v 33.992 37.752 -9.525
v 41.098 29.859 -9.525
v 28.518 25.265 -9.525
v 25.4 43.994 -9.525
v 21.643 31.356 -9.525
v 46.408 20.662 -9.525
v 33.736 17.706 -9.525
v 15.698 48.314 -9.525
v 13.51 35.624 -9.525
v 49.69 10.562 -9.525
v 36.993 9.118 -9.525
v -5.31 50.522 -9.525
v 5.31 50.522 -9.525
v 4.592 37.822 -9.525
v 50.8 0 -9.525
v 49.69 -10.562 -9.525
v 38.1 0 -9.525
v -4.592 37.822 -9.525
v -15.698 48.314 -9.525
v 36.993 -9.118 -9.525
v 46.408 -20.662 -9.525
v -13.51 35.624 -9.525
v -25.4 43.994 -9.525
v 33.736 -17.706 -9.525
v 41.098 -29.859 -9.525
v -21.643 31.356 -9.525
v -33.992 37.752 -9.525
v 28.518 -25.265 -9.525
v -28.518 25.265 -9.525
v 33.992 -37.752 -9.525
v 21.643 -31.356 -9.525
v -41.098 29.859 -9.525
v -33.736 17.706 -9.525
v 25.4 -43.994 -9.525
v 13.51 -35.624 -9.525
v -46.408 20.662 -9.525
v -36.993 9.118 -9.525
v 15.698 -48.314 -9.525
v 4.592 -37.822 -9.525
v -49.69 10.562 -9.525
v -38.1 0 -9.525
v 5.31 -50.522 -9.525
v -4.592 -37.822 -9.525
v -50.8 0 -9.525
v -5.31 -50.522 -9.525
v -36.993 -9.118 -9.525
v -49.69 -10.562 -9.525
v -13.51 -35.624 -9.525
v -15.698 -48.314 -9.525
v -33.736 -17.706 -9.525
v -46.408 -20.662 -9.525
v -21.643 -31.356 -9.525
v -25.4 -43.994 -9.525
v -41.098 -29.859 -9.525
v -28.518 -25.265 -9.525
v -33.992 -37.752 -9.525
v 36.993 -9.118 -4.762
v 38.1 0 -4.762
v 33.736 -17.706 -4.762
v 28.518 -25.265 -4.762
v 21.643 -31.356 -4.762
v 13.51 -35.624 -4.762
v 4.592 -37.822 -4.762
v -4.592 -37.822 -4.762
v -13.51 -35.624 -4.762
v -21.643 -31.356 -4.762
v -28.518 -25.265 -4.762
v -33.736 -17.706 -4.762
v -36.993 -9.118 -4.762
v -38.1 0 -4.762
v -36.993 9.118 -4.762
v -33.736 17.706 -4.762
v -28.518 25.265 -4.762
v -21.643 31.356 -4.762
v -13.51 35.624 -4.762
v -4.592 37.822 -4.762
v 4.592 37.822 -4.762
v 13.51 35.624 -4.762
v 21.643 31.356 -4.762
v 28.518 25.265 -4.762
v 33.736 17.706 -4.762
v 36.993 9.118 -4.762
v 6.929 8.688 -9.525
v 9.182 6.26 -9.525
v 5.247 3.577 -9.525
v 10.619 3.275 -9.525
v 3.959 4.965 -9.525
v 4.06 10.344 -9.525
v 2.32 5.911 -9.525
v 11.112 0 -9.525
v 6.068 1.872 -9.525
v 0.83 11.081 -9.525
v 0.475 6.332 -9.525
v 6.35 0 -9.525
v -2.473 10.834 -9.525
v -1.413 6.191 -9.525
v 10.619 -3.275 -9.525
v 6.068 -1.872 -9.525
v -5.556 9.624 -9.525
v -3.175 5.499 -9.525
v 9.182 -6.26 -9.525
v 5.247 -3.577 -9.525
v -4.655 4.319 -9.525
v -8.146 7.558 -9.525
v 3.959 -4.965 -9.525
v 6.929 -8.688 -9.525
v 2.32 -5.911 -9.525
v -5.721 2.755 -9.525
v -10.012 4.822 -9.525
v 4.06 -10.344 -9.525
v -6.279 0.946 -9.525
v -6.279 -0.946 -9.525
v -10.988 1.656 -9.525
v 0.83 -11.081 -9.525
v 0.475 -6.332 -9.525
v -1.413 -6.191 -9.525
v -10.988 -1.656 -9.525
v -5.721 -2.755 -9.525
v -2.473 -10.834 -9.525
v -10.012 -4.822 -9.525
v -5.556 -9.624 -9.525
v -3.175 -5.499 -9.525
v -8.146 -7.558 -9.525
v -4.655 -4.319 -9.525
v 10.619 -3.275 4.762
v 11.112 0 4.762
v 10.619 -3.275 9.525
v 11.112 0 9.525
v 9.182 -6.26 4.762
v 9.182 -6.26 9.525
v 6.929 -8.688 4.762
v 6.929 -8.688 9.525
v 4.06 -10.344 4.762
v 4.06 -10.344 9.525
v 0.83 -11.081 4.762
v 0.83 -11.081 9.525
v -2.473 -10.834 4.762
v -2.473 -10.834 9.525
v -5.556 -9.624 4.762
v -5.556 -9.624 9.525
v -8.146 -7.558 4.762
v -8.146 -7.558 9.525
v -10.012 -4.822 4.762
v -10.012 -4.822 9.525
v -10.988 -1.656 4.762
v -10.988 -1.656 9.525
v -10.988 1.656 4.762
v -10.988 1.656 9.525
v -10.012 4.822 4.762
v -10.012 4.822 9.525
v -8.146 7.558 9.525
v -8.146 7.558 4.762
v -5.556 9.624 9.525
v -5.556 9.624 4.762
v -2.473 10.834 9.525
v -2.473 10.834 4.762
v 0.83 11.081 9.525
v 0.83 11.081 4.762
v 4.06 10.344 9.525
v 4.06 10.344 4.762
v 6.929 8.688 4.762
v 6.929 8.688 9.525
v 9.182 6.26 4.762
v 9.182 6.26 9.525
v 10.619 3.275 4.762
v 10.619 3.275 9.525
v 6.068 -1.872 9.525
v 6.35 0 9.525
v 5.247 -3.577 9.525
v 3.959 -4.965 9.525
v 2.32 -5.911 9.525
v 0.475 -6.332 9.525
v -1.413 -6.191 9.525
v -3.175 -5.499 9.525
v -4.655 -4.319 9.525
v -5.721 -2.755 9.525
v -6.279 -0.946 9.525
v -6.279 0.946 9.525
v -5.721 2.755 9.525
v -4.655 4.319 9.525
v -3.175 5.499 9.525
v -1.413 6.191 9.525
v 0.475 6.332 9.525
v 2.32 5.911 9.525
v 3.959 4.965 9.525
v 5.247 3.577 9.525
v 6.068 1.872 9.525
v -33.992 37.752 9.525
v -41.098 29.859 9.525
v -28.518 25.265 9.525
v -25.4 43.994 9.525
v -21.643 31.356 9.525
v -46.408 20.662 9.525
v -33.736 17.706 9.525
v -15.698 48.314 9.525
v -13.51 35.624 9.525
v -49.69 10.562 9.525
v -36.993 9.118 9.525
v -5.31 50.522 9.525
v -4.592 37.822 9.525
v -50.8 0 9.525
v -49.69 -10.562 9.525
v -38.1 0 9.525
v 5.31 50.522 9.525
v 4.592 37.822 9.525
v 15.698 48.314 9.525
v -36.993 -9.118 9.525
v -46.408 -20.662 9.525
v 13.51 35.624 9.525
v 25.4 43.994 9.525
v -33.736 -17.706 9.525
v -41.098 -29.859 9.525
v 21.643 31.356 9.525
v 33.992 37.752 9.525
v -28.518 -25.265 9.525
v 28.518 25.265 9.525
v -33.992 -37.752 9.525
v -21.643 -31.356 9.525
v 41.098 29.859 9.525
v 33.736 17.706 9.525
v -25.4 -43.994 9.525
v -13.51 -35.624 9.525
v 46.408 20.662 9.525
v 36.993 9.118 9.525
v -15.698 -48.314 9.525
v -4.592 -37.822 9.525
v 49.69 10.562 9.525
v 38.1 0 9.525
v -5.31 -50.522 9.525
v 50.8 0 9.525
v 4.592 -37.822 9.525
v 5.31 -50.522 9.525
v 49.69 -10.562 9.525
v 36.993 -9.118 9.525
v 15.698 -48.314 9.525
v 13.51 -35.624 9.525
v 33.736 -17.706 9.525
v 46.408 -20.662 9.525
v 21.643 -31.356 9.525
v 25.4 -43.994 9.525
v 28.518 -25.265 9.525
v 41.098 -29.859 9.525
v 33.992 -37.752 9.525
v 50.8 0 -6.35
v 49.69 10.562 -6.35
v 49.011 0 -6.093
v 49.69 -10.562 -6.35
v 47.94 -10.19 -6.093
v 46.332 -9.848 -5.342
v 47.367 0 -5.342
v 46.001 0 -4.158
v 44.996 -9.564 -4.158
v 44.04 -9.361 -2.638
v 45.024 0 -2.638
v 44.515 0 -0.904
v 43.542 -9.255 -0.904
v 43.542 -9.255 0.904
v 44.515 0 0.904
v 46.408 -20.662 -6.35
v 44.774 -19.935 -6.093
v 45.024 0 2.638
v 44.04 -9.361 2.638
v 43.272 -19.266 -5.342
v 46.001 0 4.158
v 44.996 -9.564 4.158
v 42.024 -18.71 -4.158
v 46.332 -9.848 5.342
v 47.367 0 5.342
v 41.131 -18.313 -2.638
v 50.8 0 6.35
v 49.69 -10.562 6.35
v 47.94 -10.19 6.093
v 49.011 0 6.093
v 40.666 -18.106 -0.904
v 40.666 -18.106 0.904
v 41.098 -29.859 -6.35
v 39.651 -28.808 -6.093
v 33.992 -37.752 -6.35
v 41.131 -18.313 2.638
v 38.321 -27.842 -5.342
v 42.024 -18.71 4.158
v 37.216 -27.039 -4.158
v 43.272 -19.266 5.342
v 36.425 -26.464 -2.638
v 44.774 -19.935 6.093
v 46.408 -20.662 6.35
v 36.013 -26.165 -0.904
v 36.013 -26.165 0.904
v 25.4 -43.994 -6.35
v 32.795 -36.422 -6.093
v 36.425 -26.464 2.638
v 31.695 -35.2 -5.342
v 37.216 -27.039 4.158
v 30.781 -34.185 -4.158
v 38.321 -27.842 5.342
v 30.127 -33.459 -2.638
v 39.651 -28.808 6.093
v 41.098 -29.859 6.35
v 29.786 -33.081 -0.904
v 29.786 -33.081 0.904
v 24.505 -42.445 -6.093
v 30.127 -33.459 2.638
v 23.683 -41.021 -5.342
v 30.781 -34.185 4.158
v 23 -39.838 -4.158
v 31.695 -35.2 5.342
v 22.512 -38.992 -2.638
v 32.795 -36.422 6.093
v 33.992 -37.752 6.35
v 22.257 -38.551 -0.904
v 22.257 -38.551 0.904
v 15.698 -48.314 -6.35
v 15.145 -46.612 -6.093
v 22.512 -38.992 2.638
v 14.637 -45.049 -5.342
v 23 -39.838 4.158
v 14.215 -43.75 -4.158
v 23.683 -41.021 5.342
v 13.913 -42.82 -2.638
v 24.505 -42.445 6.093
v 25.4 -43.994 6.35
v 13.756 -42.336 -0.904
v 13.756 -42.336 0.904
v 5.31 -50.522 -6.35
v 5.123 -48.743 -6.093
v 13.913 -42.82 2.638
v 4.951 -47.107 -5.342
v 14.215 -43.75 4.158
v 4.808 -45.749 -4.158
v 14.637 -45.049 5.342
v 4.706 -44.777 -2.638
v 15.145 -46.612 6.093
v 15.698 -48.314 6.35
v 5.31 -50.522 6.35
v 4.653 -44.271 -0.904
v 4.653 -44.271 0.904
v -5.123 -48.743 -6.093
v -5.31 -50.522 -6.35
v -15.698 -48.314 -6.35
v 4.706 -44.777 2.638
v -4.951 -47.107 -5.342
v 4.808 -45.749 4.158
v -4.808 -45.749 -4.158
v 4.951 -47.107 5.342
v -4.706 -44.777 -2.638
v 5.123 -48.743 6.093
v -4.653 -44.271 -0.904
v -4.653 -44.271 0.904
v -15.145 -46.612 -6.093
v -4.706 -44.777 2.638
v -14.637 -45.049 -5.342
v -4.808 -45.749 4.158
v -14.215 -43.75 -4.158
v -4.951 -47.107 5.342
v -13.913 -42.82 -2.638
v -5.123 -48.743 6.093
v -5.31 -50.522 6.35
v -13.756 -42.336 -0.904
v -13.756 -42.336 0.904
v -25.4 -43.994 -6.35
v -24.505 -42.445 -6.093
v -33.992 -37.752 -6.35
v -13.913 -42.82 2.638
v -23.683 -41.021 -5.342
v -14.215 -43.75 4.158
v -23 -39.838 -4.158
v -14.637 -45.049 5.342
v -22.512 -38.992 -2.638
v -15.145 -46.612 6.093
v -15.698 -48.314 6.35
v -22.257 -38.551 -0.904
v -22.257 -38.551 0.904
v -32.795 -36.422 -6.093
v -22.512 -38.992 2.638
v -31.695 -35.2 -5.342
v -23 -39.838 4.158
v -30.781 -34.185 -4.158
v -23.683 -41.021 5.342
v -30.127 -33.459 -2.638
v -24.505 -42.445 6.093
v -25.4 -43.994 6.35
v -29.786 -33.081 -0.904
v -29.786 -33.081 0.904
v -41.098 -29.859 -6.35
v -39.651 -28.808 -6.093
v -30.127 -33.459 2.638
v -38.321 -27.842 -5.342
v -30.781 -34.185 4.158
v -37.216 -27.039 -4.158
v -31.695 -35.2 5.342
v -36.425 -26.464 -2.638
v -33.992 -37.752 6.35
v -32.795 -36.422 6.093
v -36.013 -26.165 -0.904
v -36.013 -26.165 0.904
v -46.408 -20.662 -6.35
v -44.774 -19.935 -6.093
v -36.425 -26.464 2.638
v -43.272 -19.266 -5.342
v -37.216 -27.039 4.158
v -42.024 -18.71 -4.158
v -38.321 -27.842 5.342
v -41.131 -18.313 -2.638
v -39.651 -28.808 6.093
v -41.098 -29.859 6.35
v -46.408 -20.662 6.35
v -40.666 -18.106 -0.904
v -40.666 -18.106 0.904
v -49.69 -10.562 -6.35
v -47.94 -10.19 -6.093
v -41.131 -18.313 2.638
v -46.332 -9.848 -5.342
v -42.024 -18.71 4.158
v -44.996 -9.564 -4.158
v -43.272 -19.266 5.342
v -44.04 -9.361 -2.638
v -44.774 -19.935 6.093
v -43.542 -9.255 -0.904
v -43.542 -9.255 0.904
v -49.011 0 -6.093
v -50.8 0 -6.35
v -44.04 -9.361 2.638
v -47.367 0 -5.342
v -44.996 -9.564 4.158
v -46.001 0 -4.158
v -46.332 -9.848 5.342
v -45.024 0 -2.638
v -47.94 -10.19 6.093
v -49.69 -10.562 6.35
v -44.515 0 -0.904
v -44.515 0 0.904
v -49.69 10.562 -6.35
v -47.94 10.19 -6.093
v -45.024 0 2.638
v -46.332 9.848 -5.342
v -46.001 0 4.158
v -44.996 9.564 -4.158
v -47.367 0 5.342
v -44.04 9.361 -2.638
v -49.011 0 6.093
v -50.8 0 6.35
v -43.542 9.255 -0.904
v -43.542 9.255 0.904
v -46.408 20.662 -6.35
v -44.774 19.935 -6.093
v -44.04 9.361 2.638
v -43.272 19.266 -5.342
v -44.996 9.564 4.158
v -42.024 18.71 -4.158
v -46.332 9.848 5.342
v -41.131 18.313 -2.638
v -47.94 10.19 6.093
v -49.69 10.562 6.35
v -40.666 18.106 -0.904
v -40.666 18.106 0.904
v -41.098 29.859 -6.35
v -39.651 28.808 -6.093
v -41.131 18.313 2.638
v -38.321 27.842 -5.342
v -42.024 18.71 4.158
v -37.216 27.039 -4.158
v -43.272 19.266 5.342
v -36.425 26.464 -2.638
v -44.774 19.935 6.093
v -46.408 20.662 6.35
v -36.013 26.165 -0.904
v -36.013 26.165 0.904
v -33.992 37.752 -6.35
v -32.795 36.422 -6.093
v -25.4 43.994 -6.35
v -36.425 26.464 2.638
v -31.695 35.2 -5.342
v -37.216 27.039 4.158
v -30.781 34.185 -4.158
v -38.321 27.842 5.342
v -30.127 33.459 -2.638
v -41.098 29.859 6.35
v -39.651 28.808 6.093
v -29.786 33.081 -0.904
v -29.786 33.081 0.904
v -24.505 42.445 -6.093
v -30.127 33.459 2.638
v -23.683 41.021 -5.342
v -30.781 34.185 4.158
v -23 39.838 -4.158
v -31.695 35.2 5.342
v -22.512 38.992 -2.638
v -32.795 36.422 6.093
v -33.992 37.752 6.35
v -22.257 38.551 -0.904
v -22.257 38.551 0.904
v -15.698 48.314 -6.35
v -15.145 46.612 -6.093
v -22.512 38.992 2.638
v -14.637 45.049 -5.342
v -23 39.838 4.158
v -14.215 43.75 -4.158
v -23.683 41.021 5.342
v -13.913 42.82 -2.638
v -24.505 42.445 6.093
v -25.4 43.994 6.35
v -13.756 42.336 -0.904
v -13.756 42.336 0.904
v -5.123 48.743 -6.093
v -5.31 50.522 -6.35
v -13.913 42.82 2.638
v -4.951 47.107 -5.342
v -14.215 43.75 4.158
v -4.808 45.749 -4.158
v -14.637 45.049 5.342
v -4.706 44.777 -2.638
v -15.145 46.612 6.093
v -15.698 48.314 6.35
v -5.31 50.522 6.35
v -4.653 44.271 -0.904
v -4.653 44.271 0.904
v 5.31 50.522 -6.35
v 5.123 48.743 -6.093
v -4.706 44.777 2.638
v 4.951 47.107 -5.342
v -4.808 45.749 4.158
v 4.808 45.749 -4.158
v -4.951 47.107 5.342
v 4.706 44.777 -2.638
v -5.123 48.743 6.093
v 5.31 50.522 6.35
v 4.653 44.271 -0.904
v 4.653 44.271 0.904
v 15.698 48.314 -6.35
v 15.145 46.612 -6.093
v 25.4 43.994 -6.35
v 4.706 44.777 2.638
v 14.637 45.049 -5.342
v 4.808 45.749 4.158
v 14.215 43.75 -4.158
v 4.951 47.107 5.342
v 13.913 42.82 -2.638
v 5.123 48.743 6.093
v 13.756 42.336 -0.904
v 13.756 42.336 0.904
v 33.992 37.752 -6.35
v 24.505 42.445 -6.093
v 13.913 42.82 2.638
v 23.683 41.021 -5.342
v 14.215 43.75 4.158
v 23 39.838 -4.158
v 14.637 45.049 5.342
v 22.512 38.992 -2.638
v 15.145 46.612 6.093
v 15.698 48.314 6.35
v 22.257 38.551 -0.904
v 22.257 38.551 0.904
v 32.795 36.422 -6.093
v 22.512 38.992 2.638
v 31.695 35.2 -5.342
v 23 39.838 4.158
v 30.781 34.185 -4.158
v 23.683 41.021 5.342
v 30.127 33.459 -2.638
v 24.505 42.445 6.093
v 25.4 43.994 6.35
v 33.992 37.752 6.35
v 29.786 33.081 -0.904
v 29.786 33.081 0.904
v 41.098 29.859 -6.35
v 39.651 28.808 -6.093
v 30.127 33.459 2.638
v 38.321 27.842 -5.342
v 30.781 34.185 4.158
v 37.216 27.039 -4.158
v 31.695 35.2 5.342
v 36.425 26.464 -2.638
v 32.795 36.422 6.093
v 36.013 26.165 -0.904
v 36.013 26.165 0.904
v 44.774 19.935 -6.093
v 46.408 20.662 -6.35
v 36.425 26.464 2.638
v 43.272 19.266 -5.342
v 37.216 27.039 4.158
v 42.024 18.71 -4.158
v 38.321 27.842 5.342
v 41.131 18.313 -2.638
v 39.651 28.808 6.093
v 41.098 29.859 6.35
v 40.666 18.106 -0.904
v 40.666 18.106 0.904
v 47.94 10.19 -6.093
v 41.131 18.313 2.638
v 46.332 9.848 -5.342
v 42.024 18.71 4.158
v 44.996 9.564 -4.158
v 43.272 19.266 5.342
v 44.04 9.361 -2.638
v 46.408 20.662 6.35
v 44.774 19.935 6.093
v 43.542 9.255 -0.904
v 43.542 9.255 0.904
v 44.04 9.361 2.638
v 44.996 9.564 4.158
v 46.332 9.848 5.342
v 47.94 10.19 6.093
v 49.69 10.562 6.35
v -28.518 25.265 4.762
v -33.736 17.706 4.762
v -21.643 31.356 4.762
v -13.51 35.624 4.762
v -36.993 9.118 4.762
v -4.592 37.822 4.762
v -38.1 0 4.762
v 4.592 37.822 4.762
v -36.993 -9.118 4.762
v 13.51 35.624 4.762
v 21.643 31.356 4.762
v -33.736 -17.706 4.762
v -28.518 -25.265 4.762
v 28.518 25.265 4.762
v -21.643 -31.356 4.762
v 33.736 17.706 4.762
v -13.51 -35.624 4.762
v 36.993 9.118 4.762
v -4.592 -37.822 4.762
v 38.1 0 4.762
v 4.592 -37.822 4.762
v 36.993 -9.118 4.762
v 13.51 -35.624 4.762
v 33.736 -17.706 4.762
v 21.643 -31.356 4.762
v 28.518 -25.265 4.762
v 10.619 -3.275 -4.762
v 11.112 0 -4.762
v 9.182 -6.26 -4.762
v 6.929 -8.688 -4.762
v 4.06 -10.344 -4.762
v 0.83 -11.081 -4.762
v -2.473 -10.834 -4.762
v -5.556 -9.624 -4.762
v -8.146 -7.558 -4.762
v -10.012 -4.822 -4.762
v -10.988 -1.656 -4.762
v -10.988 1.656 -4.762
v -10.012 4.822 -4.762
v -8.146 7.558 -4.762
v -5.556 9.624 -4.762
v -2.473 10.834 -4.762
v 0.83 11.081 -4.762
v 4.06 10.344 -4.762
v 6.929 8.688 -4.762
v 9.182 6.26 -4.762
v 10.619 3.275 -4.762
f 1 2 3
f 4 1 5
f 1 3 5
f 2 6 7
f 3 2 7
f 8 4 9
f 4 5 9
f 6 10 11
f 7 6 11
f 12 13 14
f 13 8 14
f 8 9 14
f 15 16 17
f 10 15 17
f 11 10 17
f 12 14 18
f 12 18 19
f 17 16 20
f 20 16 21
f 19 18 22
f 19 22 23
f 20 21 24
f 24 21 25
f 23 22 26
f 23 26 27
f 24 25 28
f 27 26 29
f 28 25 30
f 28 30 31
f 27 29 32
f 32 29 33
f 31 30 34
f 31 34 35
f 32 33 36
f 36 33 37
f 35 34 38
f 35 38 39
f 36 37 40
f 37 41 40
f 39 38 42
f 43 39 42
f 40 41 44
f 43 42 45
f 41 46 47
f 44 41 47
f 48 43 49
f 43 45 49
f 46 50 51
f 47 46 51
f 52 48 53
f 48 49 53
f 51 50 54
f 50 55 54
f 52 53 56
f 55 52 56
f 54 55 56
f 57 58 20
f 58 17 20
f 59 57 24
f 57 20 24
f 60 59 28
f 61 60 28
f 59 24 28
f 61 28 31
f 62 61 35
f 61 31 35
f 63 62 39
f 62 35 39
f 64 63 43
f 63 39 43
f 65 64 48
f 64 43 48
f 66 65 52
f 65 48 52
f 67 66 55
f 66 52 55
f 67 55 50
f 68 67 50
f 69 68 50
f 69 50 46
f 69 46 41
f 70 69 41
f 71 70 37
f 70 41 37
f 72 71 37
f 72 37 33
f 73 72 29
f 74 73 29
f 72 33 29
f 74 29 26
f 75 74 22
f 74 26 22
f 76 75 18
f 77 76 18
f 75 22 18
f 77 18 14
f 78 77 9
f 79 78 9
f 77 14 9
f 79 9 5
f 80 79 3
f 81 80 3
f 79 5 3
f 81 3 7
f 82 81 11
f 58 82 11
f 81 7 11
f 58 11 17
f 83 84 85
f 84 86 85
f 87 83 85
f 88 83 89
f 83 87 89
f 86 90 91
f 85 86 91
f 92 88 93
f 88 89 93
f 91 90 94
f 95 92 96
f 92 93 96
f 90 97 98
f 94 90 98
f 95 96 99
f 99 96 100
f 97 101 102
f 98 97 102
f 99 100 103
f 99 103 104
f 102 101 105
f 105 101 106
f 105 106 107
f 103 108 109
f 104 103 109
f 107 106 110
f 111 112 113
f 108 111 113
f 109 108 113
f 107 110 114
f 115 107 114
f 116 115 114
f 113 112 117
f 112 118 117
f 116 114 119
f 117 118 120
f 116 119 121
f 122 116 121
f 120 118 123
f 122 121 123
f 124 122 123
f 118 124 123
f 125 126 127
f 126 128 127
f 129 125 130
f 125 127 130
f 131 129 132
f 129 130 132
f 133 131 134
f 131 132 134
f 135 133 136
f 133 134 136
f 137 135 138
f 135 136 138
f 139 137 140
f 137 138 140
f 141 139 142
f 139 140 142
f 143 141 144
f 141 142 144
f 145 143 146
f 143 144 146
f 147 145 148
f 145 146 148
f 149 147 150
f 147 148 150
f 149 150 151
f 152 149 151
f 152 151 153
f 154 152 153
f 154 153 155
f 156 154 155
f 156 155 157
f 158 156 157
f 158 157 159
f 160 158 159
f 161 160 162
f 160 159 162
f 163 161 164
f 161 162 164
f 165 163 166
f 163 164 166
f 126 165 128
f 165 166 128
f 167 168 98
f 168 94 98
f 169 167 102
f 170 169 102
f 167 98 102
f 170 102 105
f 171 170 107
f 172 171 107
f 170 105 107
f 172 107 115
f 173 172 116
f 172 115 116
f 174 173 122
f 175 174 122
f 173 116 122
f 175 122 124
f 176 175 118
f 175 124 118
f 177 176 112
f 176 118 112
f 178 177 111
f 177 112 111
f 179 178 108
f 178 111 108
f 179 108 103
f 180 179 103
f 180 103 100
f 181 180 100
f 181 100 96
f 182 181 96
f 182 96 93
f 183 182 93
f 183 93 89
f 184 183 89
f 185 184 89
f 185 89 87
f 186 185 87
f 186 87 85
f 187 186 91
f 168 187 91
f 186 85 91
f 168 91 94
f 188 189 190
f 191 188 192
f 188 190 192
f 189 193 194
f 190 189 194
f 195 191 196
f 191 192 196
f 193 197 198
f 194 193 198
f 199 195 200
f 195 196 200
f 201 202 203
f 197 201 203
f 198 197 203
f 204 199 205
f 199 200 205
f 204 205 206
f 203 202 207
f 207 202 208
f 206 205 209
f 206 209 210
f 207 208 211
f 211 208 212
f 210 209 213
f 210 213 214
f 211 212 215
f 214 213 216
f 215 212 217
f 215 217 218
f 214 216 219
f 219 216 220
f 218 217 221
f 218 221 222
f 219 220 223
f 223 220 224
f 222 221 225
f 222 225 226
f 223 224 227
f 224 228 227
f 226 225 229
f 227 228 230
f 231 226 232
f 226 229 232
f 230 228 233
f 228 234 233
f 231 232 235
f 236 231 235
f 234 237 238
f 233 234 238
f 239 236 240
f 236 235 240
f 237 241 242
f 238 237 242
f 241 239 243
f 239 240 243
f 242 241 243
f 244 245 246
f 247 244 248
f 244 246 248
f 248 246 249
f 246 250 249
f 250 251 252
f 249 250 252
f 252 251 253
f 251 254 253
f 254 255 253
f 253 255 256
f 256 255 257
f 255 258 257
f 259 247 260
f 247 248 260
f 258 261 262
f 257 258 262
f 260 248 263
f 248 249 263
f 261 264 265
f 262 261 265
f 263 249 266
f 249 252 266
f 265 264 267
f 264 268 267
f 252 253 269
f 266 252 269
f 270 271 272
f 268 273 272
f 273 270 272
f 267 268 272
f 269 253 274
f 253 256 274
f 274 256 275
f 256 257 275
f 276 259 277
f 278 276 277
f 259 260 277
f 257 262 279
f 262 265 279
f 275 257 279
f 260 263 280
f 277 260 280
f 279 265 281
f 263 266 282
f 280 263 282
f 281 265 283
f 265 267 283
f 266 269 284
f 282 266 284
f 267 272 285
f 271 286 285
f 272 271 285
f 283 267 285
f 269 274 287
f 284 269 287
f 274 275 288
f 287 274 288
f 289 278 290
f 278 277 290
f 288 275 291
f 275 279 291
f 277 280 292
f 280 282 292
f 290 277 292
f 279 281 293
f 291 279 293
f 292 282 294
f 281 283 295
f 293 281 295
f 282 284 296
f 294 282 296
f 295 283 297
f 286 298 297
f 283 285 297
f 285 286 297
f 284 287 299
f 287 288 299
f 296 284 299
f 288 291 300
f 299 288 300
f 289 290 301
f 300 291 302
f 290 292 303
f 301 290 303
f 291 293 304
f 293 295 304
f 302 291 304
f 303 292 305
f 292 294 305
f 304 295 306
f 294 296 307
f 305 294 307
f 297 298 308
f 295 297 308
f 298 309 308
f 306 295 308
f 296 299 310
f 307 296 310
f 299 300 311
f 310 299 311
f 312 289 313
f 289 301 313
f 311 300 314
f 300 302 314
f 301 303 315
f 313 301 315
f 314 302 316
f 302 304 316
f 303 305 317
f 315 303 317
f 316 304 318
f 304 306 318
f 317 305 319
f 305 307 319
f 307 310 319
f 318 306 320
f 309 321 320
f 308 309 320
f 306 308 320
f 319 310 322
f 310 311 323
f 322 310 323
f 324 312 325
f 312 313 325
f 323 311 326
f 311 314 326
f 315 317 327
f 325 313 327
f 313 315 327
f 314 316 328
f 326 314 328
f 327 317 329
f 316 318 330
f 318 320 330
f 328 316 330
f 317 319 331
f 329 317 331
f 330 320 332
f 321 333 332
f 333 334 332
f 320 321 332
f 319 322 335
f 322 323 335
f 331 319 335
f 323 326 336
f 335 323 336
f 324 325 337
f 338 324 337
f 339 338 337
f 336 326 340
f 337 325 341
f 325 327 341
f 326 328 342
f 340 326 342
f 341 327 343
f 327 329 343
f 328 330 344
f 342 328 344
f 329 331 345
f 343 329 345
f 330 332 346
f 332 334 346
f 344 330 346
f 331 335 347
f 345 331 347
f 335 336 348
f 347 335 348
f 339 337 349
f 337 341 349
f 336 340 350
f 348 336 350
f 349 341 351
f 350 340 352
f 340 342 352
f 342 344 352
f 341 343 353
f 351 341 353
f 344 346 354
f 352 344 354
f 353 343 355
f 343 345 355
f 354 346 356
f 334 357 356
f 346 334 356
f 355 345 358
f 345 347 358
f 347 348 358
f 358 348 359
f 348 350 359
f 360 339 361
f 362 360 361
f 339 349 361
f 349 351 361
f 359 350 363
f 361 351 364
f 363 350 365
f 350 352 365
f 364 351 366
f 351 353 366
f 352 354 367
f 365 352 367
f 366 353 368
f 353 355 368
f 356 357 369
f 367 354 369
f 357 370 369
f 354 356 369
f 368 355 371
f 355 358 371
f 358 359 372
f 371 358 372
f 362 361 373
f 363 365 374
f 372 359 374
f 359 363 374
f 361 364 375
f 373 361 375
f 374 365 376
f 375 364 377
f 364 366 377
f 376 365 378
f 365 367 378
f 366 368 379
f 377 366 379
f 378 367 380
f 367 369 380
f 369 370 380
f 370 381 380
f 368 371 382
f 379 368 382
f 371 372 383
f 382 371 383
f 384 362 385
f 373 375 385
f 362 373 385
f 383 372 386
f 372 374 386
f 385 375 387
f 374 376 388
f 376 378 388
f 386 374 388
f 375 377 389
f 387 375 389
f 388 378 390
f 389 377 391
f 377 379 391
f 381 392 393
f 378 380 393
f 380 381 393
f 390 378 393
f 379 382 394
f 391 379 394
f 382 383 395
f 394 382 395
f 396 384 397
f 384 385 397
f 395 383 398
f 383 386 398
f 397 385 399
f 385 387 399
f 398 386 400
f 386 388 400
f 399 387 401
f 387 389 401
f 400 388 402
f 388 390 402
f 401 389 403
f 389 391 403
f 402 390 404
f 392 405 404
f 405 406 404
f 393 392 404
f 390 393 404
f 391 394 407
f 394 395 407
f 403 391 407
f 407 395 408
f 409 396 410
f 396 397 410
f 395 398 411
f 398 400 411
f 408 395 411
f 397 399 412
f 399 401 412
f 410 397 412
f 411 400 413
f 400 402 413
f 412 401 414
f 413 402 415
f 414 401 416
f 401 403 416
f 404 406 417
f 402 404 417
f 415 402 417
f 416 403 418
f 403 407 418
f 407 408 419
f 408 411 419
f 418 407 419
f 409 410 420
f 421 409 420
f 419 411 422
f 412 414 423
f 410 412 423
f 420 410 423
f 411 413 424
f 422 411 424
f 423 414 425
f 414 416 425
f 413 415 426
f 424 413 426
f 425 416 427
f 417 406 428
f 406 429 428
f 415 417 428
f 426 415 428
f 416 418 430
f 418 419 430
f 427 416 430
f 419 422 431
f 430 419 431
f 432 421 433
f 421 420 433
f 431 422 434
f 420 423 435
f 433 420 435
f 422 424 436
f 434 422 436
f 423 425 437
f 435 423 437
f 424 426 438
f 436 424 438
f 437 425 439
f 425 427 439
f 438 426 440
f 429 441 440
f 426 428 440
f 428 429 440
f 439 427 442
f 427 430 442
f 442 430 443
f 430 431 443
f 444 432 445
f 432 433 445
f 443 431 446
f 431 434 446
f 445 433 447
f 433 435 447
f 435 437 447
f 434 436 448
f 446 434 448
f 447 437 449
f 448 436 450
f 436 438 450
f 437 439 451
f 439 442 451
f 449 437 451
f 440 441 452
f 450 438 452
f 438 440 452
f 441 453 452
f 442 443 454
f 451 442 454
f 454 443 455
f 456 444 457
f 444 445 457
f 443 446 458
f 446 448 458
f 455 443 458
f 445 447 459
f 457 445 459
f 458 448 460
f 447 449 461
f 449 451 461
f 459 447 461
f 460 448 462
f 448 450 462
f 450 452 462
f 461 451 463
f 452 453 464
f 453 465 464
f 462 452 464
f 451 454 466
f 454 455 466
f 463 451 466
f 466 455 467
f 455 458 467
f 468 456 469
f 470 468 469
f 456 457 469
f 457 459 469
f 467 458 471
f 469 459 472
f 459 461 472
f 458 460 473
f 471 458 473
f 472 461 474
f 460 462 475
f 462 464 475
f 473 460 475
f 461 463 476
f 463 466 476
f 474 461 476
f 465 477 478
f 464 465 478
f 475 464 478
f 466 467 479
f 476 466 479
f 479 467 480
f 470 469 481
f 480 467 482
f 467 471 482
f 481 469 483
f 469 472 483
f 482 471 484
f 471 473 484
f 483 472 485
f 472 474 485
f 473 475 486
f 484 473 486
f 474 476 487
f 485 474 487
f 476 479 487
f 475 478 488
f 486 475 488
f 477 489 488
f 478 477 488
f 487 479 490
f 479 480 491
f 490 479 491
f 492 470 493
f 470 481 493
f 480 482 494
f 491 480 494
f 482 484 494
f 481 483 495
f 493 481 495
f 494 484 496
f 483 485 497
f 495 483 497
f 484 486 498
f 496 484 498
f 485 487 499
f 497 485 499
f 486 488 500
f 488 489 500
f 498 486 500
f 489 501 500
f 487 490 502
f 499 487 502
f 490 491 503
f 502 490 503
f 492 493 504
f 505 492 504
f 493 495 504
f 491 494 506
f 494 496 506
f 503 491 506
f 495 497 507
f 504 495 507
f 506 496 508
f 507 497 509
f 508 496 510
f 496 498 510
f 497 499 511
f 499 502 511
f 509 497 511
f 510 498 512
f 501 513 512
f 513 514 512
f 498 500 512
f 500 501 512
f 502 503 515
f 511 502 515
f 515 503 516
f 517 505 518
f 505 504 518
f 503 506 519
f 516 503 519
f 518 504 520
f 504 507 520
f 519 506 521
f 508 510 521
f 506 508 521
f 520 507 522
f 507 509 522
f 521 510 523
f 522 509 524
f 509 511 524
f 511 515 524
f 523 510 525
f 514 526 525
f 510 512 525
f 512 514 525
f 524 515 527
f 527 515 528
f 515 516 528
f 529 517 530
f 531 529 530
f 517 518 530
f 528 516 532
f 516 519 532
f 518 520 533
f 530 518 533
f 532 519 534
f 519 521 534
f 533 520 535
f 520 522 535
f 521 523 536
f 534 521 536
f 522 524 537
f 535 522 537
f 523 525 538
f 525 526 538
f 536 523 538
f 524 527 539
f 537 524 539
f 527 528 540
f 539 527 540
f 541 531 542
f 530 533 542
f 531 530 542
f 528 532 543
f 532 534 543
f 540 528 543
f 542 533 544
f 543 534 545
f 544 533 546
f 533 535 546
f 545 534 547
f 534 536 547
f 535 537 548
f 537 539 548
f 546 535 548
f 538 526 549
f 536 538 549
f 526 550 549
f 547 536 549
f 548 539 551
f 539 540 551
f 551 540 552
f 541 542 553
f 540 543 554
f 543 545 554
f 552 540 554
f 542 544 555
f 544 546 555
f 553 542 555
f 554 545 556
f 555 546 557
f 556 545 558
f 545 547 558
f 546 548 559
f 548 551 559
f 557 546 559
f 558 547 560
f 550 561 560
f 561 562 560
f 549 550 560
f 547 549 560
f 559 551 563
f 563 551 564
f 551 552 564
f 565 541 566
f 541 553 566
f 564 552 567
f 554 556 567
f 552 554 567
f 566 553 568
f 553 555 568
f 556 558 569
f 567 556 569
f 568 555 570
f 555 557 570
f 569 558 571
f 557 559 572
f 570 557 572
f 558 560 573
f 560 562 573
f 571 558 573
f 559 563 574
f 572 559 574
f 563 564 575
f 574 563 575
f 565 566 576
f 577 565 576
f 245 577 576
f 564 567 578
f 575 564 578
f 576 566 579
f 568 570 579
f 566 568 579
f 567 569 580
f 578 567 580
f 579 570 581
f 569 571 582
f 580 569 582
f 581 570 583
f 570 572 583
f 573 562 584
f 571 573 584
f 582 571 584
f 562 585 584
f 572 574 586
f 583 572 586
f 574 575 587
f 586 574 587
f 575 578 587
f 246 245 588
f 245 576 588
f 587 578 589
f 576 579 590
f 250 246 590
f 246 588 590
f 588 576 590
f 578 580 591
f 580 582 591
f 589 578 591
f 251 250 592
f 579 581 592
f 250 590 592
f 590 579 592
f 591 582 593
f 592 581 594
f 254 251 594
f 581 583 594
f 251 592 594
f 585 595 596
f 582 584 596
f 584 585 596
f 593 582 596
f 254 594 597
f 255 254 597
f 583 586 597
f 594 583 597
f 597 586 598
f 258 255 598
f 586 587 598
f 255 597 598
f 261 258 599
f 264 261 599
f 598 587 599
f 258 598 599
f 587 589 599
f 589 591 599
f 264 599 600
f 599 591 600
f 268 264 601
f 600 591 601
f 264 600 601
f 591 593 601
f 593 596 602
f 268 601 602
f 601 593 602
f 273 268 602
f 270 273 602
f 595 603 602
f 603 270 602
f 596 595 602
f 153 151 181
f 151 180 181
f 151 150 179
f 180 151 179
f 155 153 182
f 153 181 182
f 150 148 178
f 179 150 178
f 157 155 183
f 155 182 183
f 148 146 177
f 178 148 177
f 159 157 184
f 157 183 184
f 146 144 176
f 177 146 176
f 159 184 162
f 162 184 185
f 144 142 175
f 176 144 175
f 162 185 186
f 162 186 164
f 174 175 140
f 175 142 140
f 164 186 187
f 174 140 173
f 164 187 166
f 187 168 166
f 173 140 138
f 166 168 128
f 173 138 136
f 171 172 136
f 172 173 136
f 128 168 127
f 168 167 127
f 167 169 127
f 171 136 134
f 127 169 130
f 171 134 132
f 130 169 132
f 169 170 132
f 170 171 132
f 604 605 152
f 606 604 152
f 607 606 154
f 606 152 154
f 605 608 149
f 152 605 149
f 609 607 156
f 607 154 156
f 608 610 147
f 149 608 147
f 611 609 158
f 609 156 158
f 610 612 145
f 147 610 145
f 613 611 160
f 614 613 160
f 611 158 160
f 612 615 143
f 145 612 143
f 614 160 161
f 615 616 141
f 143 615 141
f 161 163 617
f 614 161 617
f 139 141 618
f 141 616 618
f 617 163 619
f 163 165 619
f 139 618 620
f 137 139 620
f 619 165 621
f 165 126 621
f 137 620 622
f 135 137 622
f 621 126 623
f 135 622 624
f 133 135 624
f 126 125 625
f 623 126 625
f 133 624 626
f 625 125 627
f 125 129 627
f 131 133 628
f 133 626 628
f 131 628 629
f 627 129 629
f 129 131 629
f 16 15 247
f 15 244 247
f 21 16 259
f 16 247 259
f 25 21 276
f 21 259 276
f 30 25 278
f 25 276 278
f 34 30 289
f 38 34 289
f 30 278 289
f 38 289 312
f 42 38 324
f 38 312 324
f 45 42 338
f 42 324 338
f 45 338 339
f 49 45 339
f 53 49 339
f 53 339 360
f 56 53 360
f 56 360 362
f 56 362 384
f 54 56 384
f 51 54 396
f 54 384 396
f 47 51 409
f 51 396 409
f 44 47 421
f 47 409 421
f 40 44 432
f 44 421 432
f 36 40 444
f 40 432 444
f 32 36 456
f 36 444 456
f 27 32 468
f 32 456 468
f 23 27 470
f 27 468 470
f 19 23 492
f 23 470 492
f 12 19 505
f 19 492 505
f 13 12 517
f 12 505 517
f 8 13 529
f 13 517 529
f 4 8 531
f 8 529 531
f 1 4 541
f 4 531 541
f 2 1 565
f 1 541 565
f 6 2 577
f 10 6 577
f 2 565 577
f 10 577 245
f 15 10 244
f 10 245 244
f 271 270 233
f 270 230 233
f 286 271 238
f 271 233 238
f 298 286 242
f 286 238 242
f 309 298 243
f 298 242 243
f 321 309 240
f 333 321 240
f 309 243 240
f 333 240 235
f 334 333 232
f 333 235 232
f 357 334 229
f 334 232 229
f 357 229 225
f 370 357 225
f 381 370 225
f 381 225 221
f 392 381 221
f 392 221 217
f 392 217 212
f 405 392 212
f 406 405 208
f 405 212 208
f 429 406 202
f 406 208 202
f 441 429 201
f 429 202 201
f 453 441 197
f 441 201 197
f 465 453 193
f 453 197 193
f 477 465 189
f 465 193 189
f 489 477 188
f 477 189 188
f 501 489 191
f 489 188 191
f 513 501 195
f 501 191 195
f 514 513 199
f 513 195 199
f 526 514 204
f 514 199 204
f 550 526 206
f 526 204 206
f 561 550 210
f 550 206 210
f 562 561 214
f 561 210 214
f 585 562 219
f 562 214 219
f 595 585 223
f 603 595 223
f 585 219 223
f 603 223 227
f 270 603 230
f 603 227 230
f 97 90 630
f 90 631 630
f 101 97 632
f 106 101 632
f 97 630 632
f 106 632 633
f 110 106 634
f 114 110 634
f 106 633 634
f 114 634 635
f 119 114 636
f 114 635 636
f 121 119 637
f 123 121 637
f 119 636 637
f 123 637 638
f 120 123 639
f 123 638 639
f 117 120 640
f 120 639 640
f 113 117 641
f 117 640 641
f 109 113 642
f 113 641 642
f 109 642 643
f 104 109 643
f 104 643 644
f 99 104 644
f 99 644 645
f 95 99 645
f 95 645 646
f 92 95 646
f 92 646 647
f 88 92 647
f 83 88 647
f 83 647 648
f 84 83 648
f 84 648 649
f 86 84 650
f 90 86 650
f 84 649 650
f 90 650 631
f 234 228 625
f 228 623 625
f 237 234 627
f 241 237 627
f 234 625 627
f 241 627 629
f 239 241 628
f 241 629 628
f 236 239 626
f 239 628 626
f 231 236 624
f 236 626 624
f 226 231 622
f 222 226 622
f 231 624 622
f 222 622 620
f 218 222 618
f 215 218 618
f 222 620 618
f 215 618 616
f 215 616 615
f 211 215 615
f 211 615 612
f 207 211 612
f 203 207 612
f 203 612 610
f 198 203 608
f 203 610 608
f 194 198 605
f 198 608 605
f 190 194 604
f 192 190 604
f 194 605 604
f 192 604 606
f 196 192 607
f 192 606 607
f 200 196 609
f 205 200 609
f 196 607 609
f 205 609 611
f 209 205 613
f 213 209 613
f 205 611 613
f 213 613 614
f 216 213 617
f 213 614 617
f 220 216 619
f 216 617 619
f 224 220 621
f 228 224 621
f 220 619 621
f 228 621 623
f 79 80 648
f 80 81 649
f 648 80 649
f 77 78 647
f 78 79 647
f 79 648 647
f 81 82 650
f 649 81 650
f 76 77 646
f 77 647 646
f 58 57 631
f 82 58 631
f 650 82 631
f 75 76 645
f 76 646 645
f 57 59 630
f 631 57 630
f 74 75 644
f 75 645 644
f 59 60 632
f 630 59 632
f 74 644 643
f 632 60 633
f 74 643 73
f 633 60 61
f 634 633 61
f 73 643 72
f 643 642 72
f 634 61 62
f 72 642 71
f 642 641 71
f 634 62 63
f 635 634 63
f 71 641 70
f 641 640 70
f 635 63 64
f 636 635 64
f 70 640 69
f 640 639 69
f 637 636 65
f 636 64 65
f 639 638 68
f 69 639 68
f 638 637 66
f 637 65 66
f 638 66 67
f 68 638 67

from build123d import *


with BuildPart() as part:
    # Sketch1 → Revolve1 (revolve)
    with BuildSketch(Plane(origin=(0, 0, 0), x_dir=(0, 0, -1), z_dir=(1, 0, 0)), mode=Mode.PRIVATE) as revolve1_sk:
        with BuildLine():
            Line((-9.525, 6.35), (9.525, 6.35))
            Line((9.525, 6.35), (9.525, 11.1125))
            Line((9.525, 11.1125), (4.7625, 11.1125))
            Line((4.7625, 11.1125), (4.7625, 38.1))
            Line((4.7625, 38.1), (9.525, 38.1))
            Line((9.525, 38.1), (9.525, 50.8))
            Line((9.525, 50.8), (6.35, 50.8))
            ThreePointArc((6.35, 50.8), (0, 44.45), (-6.35, 50.8))
            Line((-6.35, 50.8), (-9.525, 50.8))
            Line((-9.525, 50.8), (-9.525, 38.1))
            Line((-9.525, 38.1), (-4.7625, 38.1))
            Line((-4.7625, 38.1), (-4.7625, 11.1125))
            Line((-4.7625, 11.1125), (-9.525, 11.1125))
            Line((-9.525, 11.1125), (-9.525, 6.35))
        make_face()
    revolve(revolve1_sk.sketch.rotate(Axis((0, 0, 17.864143374), (0, 0, -1)), 90), axis=Axis((0, 0, 17.864143374), (0, 0, -1)))


solid = part.part
